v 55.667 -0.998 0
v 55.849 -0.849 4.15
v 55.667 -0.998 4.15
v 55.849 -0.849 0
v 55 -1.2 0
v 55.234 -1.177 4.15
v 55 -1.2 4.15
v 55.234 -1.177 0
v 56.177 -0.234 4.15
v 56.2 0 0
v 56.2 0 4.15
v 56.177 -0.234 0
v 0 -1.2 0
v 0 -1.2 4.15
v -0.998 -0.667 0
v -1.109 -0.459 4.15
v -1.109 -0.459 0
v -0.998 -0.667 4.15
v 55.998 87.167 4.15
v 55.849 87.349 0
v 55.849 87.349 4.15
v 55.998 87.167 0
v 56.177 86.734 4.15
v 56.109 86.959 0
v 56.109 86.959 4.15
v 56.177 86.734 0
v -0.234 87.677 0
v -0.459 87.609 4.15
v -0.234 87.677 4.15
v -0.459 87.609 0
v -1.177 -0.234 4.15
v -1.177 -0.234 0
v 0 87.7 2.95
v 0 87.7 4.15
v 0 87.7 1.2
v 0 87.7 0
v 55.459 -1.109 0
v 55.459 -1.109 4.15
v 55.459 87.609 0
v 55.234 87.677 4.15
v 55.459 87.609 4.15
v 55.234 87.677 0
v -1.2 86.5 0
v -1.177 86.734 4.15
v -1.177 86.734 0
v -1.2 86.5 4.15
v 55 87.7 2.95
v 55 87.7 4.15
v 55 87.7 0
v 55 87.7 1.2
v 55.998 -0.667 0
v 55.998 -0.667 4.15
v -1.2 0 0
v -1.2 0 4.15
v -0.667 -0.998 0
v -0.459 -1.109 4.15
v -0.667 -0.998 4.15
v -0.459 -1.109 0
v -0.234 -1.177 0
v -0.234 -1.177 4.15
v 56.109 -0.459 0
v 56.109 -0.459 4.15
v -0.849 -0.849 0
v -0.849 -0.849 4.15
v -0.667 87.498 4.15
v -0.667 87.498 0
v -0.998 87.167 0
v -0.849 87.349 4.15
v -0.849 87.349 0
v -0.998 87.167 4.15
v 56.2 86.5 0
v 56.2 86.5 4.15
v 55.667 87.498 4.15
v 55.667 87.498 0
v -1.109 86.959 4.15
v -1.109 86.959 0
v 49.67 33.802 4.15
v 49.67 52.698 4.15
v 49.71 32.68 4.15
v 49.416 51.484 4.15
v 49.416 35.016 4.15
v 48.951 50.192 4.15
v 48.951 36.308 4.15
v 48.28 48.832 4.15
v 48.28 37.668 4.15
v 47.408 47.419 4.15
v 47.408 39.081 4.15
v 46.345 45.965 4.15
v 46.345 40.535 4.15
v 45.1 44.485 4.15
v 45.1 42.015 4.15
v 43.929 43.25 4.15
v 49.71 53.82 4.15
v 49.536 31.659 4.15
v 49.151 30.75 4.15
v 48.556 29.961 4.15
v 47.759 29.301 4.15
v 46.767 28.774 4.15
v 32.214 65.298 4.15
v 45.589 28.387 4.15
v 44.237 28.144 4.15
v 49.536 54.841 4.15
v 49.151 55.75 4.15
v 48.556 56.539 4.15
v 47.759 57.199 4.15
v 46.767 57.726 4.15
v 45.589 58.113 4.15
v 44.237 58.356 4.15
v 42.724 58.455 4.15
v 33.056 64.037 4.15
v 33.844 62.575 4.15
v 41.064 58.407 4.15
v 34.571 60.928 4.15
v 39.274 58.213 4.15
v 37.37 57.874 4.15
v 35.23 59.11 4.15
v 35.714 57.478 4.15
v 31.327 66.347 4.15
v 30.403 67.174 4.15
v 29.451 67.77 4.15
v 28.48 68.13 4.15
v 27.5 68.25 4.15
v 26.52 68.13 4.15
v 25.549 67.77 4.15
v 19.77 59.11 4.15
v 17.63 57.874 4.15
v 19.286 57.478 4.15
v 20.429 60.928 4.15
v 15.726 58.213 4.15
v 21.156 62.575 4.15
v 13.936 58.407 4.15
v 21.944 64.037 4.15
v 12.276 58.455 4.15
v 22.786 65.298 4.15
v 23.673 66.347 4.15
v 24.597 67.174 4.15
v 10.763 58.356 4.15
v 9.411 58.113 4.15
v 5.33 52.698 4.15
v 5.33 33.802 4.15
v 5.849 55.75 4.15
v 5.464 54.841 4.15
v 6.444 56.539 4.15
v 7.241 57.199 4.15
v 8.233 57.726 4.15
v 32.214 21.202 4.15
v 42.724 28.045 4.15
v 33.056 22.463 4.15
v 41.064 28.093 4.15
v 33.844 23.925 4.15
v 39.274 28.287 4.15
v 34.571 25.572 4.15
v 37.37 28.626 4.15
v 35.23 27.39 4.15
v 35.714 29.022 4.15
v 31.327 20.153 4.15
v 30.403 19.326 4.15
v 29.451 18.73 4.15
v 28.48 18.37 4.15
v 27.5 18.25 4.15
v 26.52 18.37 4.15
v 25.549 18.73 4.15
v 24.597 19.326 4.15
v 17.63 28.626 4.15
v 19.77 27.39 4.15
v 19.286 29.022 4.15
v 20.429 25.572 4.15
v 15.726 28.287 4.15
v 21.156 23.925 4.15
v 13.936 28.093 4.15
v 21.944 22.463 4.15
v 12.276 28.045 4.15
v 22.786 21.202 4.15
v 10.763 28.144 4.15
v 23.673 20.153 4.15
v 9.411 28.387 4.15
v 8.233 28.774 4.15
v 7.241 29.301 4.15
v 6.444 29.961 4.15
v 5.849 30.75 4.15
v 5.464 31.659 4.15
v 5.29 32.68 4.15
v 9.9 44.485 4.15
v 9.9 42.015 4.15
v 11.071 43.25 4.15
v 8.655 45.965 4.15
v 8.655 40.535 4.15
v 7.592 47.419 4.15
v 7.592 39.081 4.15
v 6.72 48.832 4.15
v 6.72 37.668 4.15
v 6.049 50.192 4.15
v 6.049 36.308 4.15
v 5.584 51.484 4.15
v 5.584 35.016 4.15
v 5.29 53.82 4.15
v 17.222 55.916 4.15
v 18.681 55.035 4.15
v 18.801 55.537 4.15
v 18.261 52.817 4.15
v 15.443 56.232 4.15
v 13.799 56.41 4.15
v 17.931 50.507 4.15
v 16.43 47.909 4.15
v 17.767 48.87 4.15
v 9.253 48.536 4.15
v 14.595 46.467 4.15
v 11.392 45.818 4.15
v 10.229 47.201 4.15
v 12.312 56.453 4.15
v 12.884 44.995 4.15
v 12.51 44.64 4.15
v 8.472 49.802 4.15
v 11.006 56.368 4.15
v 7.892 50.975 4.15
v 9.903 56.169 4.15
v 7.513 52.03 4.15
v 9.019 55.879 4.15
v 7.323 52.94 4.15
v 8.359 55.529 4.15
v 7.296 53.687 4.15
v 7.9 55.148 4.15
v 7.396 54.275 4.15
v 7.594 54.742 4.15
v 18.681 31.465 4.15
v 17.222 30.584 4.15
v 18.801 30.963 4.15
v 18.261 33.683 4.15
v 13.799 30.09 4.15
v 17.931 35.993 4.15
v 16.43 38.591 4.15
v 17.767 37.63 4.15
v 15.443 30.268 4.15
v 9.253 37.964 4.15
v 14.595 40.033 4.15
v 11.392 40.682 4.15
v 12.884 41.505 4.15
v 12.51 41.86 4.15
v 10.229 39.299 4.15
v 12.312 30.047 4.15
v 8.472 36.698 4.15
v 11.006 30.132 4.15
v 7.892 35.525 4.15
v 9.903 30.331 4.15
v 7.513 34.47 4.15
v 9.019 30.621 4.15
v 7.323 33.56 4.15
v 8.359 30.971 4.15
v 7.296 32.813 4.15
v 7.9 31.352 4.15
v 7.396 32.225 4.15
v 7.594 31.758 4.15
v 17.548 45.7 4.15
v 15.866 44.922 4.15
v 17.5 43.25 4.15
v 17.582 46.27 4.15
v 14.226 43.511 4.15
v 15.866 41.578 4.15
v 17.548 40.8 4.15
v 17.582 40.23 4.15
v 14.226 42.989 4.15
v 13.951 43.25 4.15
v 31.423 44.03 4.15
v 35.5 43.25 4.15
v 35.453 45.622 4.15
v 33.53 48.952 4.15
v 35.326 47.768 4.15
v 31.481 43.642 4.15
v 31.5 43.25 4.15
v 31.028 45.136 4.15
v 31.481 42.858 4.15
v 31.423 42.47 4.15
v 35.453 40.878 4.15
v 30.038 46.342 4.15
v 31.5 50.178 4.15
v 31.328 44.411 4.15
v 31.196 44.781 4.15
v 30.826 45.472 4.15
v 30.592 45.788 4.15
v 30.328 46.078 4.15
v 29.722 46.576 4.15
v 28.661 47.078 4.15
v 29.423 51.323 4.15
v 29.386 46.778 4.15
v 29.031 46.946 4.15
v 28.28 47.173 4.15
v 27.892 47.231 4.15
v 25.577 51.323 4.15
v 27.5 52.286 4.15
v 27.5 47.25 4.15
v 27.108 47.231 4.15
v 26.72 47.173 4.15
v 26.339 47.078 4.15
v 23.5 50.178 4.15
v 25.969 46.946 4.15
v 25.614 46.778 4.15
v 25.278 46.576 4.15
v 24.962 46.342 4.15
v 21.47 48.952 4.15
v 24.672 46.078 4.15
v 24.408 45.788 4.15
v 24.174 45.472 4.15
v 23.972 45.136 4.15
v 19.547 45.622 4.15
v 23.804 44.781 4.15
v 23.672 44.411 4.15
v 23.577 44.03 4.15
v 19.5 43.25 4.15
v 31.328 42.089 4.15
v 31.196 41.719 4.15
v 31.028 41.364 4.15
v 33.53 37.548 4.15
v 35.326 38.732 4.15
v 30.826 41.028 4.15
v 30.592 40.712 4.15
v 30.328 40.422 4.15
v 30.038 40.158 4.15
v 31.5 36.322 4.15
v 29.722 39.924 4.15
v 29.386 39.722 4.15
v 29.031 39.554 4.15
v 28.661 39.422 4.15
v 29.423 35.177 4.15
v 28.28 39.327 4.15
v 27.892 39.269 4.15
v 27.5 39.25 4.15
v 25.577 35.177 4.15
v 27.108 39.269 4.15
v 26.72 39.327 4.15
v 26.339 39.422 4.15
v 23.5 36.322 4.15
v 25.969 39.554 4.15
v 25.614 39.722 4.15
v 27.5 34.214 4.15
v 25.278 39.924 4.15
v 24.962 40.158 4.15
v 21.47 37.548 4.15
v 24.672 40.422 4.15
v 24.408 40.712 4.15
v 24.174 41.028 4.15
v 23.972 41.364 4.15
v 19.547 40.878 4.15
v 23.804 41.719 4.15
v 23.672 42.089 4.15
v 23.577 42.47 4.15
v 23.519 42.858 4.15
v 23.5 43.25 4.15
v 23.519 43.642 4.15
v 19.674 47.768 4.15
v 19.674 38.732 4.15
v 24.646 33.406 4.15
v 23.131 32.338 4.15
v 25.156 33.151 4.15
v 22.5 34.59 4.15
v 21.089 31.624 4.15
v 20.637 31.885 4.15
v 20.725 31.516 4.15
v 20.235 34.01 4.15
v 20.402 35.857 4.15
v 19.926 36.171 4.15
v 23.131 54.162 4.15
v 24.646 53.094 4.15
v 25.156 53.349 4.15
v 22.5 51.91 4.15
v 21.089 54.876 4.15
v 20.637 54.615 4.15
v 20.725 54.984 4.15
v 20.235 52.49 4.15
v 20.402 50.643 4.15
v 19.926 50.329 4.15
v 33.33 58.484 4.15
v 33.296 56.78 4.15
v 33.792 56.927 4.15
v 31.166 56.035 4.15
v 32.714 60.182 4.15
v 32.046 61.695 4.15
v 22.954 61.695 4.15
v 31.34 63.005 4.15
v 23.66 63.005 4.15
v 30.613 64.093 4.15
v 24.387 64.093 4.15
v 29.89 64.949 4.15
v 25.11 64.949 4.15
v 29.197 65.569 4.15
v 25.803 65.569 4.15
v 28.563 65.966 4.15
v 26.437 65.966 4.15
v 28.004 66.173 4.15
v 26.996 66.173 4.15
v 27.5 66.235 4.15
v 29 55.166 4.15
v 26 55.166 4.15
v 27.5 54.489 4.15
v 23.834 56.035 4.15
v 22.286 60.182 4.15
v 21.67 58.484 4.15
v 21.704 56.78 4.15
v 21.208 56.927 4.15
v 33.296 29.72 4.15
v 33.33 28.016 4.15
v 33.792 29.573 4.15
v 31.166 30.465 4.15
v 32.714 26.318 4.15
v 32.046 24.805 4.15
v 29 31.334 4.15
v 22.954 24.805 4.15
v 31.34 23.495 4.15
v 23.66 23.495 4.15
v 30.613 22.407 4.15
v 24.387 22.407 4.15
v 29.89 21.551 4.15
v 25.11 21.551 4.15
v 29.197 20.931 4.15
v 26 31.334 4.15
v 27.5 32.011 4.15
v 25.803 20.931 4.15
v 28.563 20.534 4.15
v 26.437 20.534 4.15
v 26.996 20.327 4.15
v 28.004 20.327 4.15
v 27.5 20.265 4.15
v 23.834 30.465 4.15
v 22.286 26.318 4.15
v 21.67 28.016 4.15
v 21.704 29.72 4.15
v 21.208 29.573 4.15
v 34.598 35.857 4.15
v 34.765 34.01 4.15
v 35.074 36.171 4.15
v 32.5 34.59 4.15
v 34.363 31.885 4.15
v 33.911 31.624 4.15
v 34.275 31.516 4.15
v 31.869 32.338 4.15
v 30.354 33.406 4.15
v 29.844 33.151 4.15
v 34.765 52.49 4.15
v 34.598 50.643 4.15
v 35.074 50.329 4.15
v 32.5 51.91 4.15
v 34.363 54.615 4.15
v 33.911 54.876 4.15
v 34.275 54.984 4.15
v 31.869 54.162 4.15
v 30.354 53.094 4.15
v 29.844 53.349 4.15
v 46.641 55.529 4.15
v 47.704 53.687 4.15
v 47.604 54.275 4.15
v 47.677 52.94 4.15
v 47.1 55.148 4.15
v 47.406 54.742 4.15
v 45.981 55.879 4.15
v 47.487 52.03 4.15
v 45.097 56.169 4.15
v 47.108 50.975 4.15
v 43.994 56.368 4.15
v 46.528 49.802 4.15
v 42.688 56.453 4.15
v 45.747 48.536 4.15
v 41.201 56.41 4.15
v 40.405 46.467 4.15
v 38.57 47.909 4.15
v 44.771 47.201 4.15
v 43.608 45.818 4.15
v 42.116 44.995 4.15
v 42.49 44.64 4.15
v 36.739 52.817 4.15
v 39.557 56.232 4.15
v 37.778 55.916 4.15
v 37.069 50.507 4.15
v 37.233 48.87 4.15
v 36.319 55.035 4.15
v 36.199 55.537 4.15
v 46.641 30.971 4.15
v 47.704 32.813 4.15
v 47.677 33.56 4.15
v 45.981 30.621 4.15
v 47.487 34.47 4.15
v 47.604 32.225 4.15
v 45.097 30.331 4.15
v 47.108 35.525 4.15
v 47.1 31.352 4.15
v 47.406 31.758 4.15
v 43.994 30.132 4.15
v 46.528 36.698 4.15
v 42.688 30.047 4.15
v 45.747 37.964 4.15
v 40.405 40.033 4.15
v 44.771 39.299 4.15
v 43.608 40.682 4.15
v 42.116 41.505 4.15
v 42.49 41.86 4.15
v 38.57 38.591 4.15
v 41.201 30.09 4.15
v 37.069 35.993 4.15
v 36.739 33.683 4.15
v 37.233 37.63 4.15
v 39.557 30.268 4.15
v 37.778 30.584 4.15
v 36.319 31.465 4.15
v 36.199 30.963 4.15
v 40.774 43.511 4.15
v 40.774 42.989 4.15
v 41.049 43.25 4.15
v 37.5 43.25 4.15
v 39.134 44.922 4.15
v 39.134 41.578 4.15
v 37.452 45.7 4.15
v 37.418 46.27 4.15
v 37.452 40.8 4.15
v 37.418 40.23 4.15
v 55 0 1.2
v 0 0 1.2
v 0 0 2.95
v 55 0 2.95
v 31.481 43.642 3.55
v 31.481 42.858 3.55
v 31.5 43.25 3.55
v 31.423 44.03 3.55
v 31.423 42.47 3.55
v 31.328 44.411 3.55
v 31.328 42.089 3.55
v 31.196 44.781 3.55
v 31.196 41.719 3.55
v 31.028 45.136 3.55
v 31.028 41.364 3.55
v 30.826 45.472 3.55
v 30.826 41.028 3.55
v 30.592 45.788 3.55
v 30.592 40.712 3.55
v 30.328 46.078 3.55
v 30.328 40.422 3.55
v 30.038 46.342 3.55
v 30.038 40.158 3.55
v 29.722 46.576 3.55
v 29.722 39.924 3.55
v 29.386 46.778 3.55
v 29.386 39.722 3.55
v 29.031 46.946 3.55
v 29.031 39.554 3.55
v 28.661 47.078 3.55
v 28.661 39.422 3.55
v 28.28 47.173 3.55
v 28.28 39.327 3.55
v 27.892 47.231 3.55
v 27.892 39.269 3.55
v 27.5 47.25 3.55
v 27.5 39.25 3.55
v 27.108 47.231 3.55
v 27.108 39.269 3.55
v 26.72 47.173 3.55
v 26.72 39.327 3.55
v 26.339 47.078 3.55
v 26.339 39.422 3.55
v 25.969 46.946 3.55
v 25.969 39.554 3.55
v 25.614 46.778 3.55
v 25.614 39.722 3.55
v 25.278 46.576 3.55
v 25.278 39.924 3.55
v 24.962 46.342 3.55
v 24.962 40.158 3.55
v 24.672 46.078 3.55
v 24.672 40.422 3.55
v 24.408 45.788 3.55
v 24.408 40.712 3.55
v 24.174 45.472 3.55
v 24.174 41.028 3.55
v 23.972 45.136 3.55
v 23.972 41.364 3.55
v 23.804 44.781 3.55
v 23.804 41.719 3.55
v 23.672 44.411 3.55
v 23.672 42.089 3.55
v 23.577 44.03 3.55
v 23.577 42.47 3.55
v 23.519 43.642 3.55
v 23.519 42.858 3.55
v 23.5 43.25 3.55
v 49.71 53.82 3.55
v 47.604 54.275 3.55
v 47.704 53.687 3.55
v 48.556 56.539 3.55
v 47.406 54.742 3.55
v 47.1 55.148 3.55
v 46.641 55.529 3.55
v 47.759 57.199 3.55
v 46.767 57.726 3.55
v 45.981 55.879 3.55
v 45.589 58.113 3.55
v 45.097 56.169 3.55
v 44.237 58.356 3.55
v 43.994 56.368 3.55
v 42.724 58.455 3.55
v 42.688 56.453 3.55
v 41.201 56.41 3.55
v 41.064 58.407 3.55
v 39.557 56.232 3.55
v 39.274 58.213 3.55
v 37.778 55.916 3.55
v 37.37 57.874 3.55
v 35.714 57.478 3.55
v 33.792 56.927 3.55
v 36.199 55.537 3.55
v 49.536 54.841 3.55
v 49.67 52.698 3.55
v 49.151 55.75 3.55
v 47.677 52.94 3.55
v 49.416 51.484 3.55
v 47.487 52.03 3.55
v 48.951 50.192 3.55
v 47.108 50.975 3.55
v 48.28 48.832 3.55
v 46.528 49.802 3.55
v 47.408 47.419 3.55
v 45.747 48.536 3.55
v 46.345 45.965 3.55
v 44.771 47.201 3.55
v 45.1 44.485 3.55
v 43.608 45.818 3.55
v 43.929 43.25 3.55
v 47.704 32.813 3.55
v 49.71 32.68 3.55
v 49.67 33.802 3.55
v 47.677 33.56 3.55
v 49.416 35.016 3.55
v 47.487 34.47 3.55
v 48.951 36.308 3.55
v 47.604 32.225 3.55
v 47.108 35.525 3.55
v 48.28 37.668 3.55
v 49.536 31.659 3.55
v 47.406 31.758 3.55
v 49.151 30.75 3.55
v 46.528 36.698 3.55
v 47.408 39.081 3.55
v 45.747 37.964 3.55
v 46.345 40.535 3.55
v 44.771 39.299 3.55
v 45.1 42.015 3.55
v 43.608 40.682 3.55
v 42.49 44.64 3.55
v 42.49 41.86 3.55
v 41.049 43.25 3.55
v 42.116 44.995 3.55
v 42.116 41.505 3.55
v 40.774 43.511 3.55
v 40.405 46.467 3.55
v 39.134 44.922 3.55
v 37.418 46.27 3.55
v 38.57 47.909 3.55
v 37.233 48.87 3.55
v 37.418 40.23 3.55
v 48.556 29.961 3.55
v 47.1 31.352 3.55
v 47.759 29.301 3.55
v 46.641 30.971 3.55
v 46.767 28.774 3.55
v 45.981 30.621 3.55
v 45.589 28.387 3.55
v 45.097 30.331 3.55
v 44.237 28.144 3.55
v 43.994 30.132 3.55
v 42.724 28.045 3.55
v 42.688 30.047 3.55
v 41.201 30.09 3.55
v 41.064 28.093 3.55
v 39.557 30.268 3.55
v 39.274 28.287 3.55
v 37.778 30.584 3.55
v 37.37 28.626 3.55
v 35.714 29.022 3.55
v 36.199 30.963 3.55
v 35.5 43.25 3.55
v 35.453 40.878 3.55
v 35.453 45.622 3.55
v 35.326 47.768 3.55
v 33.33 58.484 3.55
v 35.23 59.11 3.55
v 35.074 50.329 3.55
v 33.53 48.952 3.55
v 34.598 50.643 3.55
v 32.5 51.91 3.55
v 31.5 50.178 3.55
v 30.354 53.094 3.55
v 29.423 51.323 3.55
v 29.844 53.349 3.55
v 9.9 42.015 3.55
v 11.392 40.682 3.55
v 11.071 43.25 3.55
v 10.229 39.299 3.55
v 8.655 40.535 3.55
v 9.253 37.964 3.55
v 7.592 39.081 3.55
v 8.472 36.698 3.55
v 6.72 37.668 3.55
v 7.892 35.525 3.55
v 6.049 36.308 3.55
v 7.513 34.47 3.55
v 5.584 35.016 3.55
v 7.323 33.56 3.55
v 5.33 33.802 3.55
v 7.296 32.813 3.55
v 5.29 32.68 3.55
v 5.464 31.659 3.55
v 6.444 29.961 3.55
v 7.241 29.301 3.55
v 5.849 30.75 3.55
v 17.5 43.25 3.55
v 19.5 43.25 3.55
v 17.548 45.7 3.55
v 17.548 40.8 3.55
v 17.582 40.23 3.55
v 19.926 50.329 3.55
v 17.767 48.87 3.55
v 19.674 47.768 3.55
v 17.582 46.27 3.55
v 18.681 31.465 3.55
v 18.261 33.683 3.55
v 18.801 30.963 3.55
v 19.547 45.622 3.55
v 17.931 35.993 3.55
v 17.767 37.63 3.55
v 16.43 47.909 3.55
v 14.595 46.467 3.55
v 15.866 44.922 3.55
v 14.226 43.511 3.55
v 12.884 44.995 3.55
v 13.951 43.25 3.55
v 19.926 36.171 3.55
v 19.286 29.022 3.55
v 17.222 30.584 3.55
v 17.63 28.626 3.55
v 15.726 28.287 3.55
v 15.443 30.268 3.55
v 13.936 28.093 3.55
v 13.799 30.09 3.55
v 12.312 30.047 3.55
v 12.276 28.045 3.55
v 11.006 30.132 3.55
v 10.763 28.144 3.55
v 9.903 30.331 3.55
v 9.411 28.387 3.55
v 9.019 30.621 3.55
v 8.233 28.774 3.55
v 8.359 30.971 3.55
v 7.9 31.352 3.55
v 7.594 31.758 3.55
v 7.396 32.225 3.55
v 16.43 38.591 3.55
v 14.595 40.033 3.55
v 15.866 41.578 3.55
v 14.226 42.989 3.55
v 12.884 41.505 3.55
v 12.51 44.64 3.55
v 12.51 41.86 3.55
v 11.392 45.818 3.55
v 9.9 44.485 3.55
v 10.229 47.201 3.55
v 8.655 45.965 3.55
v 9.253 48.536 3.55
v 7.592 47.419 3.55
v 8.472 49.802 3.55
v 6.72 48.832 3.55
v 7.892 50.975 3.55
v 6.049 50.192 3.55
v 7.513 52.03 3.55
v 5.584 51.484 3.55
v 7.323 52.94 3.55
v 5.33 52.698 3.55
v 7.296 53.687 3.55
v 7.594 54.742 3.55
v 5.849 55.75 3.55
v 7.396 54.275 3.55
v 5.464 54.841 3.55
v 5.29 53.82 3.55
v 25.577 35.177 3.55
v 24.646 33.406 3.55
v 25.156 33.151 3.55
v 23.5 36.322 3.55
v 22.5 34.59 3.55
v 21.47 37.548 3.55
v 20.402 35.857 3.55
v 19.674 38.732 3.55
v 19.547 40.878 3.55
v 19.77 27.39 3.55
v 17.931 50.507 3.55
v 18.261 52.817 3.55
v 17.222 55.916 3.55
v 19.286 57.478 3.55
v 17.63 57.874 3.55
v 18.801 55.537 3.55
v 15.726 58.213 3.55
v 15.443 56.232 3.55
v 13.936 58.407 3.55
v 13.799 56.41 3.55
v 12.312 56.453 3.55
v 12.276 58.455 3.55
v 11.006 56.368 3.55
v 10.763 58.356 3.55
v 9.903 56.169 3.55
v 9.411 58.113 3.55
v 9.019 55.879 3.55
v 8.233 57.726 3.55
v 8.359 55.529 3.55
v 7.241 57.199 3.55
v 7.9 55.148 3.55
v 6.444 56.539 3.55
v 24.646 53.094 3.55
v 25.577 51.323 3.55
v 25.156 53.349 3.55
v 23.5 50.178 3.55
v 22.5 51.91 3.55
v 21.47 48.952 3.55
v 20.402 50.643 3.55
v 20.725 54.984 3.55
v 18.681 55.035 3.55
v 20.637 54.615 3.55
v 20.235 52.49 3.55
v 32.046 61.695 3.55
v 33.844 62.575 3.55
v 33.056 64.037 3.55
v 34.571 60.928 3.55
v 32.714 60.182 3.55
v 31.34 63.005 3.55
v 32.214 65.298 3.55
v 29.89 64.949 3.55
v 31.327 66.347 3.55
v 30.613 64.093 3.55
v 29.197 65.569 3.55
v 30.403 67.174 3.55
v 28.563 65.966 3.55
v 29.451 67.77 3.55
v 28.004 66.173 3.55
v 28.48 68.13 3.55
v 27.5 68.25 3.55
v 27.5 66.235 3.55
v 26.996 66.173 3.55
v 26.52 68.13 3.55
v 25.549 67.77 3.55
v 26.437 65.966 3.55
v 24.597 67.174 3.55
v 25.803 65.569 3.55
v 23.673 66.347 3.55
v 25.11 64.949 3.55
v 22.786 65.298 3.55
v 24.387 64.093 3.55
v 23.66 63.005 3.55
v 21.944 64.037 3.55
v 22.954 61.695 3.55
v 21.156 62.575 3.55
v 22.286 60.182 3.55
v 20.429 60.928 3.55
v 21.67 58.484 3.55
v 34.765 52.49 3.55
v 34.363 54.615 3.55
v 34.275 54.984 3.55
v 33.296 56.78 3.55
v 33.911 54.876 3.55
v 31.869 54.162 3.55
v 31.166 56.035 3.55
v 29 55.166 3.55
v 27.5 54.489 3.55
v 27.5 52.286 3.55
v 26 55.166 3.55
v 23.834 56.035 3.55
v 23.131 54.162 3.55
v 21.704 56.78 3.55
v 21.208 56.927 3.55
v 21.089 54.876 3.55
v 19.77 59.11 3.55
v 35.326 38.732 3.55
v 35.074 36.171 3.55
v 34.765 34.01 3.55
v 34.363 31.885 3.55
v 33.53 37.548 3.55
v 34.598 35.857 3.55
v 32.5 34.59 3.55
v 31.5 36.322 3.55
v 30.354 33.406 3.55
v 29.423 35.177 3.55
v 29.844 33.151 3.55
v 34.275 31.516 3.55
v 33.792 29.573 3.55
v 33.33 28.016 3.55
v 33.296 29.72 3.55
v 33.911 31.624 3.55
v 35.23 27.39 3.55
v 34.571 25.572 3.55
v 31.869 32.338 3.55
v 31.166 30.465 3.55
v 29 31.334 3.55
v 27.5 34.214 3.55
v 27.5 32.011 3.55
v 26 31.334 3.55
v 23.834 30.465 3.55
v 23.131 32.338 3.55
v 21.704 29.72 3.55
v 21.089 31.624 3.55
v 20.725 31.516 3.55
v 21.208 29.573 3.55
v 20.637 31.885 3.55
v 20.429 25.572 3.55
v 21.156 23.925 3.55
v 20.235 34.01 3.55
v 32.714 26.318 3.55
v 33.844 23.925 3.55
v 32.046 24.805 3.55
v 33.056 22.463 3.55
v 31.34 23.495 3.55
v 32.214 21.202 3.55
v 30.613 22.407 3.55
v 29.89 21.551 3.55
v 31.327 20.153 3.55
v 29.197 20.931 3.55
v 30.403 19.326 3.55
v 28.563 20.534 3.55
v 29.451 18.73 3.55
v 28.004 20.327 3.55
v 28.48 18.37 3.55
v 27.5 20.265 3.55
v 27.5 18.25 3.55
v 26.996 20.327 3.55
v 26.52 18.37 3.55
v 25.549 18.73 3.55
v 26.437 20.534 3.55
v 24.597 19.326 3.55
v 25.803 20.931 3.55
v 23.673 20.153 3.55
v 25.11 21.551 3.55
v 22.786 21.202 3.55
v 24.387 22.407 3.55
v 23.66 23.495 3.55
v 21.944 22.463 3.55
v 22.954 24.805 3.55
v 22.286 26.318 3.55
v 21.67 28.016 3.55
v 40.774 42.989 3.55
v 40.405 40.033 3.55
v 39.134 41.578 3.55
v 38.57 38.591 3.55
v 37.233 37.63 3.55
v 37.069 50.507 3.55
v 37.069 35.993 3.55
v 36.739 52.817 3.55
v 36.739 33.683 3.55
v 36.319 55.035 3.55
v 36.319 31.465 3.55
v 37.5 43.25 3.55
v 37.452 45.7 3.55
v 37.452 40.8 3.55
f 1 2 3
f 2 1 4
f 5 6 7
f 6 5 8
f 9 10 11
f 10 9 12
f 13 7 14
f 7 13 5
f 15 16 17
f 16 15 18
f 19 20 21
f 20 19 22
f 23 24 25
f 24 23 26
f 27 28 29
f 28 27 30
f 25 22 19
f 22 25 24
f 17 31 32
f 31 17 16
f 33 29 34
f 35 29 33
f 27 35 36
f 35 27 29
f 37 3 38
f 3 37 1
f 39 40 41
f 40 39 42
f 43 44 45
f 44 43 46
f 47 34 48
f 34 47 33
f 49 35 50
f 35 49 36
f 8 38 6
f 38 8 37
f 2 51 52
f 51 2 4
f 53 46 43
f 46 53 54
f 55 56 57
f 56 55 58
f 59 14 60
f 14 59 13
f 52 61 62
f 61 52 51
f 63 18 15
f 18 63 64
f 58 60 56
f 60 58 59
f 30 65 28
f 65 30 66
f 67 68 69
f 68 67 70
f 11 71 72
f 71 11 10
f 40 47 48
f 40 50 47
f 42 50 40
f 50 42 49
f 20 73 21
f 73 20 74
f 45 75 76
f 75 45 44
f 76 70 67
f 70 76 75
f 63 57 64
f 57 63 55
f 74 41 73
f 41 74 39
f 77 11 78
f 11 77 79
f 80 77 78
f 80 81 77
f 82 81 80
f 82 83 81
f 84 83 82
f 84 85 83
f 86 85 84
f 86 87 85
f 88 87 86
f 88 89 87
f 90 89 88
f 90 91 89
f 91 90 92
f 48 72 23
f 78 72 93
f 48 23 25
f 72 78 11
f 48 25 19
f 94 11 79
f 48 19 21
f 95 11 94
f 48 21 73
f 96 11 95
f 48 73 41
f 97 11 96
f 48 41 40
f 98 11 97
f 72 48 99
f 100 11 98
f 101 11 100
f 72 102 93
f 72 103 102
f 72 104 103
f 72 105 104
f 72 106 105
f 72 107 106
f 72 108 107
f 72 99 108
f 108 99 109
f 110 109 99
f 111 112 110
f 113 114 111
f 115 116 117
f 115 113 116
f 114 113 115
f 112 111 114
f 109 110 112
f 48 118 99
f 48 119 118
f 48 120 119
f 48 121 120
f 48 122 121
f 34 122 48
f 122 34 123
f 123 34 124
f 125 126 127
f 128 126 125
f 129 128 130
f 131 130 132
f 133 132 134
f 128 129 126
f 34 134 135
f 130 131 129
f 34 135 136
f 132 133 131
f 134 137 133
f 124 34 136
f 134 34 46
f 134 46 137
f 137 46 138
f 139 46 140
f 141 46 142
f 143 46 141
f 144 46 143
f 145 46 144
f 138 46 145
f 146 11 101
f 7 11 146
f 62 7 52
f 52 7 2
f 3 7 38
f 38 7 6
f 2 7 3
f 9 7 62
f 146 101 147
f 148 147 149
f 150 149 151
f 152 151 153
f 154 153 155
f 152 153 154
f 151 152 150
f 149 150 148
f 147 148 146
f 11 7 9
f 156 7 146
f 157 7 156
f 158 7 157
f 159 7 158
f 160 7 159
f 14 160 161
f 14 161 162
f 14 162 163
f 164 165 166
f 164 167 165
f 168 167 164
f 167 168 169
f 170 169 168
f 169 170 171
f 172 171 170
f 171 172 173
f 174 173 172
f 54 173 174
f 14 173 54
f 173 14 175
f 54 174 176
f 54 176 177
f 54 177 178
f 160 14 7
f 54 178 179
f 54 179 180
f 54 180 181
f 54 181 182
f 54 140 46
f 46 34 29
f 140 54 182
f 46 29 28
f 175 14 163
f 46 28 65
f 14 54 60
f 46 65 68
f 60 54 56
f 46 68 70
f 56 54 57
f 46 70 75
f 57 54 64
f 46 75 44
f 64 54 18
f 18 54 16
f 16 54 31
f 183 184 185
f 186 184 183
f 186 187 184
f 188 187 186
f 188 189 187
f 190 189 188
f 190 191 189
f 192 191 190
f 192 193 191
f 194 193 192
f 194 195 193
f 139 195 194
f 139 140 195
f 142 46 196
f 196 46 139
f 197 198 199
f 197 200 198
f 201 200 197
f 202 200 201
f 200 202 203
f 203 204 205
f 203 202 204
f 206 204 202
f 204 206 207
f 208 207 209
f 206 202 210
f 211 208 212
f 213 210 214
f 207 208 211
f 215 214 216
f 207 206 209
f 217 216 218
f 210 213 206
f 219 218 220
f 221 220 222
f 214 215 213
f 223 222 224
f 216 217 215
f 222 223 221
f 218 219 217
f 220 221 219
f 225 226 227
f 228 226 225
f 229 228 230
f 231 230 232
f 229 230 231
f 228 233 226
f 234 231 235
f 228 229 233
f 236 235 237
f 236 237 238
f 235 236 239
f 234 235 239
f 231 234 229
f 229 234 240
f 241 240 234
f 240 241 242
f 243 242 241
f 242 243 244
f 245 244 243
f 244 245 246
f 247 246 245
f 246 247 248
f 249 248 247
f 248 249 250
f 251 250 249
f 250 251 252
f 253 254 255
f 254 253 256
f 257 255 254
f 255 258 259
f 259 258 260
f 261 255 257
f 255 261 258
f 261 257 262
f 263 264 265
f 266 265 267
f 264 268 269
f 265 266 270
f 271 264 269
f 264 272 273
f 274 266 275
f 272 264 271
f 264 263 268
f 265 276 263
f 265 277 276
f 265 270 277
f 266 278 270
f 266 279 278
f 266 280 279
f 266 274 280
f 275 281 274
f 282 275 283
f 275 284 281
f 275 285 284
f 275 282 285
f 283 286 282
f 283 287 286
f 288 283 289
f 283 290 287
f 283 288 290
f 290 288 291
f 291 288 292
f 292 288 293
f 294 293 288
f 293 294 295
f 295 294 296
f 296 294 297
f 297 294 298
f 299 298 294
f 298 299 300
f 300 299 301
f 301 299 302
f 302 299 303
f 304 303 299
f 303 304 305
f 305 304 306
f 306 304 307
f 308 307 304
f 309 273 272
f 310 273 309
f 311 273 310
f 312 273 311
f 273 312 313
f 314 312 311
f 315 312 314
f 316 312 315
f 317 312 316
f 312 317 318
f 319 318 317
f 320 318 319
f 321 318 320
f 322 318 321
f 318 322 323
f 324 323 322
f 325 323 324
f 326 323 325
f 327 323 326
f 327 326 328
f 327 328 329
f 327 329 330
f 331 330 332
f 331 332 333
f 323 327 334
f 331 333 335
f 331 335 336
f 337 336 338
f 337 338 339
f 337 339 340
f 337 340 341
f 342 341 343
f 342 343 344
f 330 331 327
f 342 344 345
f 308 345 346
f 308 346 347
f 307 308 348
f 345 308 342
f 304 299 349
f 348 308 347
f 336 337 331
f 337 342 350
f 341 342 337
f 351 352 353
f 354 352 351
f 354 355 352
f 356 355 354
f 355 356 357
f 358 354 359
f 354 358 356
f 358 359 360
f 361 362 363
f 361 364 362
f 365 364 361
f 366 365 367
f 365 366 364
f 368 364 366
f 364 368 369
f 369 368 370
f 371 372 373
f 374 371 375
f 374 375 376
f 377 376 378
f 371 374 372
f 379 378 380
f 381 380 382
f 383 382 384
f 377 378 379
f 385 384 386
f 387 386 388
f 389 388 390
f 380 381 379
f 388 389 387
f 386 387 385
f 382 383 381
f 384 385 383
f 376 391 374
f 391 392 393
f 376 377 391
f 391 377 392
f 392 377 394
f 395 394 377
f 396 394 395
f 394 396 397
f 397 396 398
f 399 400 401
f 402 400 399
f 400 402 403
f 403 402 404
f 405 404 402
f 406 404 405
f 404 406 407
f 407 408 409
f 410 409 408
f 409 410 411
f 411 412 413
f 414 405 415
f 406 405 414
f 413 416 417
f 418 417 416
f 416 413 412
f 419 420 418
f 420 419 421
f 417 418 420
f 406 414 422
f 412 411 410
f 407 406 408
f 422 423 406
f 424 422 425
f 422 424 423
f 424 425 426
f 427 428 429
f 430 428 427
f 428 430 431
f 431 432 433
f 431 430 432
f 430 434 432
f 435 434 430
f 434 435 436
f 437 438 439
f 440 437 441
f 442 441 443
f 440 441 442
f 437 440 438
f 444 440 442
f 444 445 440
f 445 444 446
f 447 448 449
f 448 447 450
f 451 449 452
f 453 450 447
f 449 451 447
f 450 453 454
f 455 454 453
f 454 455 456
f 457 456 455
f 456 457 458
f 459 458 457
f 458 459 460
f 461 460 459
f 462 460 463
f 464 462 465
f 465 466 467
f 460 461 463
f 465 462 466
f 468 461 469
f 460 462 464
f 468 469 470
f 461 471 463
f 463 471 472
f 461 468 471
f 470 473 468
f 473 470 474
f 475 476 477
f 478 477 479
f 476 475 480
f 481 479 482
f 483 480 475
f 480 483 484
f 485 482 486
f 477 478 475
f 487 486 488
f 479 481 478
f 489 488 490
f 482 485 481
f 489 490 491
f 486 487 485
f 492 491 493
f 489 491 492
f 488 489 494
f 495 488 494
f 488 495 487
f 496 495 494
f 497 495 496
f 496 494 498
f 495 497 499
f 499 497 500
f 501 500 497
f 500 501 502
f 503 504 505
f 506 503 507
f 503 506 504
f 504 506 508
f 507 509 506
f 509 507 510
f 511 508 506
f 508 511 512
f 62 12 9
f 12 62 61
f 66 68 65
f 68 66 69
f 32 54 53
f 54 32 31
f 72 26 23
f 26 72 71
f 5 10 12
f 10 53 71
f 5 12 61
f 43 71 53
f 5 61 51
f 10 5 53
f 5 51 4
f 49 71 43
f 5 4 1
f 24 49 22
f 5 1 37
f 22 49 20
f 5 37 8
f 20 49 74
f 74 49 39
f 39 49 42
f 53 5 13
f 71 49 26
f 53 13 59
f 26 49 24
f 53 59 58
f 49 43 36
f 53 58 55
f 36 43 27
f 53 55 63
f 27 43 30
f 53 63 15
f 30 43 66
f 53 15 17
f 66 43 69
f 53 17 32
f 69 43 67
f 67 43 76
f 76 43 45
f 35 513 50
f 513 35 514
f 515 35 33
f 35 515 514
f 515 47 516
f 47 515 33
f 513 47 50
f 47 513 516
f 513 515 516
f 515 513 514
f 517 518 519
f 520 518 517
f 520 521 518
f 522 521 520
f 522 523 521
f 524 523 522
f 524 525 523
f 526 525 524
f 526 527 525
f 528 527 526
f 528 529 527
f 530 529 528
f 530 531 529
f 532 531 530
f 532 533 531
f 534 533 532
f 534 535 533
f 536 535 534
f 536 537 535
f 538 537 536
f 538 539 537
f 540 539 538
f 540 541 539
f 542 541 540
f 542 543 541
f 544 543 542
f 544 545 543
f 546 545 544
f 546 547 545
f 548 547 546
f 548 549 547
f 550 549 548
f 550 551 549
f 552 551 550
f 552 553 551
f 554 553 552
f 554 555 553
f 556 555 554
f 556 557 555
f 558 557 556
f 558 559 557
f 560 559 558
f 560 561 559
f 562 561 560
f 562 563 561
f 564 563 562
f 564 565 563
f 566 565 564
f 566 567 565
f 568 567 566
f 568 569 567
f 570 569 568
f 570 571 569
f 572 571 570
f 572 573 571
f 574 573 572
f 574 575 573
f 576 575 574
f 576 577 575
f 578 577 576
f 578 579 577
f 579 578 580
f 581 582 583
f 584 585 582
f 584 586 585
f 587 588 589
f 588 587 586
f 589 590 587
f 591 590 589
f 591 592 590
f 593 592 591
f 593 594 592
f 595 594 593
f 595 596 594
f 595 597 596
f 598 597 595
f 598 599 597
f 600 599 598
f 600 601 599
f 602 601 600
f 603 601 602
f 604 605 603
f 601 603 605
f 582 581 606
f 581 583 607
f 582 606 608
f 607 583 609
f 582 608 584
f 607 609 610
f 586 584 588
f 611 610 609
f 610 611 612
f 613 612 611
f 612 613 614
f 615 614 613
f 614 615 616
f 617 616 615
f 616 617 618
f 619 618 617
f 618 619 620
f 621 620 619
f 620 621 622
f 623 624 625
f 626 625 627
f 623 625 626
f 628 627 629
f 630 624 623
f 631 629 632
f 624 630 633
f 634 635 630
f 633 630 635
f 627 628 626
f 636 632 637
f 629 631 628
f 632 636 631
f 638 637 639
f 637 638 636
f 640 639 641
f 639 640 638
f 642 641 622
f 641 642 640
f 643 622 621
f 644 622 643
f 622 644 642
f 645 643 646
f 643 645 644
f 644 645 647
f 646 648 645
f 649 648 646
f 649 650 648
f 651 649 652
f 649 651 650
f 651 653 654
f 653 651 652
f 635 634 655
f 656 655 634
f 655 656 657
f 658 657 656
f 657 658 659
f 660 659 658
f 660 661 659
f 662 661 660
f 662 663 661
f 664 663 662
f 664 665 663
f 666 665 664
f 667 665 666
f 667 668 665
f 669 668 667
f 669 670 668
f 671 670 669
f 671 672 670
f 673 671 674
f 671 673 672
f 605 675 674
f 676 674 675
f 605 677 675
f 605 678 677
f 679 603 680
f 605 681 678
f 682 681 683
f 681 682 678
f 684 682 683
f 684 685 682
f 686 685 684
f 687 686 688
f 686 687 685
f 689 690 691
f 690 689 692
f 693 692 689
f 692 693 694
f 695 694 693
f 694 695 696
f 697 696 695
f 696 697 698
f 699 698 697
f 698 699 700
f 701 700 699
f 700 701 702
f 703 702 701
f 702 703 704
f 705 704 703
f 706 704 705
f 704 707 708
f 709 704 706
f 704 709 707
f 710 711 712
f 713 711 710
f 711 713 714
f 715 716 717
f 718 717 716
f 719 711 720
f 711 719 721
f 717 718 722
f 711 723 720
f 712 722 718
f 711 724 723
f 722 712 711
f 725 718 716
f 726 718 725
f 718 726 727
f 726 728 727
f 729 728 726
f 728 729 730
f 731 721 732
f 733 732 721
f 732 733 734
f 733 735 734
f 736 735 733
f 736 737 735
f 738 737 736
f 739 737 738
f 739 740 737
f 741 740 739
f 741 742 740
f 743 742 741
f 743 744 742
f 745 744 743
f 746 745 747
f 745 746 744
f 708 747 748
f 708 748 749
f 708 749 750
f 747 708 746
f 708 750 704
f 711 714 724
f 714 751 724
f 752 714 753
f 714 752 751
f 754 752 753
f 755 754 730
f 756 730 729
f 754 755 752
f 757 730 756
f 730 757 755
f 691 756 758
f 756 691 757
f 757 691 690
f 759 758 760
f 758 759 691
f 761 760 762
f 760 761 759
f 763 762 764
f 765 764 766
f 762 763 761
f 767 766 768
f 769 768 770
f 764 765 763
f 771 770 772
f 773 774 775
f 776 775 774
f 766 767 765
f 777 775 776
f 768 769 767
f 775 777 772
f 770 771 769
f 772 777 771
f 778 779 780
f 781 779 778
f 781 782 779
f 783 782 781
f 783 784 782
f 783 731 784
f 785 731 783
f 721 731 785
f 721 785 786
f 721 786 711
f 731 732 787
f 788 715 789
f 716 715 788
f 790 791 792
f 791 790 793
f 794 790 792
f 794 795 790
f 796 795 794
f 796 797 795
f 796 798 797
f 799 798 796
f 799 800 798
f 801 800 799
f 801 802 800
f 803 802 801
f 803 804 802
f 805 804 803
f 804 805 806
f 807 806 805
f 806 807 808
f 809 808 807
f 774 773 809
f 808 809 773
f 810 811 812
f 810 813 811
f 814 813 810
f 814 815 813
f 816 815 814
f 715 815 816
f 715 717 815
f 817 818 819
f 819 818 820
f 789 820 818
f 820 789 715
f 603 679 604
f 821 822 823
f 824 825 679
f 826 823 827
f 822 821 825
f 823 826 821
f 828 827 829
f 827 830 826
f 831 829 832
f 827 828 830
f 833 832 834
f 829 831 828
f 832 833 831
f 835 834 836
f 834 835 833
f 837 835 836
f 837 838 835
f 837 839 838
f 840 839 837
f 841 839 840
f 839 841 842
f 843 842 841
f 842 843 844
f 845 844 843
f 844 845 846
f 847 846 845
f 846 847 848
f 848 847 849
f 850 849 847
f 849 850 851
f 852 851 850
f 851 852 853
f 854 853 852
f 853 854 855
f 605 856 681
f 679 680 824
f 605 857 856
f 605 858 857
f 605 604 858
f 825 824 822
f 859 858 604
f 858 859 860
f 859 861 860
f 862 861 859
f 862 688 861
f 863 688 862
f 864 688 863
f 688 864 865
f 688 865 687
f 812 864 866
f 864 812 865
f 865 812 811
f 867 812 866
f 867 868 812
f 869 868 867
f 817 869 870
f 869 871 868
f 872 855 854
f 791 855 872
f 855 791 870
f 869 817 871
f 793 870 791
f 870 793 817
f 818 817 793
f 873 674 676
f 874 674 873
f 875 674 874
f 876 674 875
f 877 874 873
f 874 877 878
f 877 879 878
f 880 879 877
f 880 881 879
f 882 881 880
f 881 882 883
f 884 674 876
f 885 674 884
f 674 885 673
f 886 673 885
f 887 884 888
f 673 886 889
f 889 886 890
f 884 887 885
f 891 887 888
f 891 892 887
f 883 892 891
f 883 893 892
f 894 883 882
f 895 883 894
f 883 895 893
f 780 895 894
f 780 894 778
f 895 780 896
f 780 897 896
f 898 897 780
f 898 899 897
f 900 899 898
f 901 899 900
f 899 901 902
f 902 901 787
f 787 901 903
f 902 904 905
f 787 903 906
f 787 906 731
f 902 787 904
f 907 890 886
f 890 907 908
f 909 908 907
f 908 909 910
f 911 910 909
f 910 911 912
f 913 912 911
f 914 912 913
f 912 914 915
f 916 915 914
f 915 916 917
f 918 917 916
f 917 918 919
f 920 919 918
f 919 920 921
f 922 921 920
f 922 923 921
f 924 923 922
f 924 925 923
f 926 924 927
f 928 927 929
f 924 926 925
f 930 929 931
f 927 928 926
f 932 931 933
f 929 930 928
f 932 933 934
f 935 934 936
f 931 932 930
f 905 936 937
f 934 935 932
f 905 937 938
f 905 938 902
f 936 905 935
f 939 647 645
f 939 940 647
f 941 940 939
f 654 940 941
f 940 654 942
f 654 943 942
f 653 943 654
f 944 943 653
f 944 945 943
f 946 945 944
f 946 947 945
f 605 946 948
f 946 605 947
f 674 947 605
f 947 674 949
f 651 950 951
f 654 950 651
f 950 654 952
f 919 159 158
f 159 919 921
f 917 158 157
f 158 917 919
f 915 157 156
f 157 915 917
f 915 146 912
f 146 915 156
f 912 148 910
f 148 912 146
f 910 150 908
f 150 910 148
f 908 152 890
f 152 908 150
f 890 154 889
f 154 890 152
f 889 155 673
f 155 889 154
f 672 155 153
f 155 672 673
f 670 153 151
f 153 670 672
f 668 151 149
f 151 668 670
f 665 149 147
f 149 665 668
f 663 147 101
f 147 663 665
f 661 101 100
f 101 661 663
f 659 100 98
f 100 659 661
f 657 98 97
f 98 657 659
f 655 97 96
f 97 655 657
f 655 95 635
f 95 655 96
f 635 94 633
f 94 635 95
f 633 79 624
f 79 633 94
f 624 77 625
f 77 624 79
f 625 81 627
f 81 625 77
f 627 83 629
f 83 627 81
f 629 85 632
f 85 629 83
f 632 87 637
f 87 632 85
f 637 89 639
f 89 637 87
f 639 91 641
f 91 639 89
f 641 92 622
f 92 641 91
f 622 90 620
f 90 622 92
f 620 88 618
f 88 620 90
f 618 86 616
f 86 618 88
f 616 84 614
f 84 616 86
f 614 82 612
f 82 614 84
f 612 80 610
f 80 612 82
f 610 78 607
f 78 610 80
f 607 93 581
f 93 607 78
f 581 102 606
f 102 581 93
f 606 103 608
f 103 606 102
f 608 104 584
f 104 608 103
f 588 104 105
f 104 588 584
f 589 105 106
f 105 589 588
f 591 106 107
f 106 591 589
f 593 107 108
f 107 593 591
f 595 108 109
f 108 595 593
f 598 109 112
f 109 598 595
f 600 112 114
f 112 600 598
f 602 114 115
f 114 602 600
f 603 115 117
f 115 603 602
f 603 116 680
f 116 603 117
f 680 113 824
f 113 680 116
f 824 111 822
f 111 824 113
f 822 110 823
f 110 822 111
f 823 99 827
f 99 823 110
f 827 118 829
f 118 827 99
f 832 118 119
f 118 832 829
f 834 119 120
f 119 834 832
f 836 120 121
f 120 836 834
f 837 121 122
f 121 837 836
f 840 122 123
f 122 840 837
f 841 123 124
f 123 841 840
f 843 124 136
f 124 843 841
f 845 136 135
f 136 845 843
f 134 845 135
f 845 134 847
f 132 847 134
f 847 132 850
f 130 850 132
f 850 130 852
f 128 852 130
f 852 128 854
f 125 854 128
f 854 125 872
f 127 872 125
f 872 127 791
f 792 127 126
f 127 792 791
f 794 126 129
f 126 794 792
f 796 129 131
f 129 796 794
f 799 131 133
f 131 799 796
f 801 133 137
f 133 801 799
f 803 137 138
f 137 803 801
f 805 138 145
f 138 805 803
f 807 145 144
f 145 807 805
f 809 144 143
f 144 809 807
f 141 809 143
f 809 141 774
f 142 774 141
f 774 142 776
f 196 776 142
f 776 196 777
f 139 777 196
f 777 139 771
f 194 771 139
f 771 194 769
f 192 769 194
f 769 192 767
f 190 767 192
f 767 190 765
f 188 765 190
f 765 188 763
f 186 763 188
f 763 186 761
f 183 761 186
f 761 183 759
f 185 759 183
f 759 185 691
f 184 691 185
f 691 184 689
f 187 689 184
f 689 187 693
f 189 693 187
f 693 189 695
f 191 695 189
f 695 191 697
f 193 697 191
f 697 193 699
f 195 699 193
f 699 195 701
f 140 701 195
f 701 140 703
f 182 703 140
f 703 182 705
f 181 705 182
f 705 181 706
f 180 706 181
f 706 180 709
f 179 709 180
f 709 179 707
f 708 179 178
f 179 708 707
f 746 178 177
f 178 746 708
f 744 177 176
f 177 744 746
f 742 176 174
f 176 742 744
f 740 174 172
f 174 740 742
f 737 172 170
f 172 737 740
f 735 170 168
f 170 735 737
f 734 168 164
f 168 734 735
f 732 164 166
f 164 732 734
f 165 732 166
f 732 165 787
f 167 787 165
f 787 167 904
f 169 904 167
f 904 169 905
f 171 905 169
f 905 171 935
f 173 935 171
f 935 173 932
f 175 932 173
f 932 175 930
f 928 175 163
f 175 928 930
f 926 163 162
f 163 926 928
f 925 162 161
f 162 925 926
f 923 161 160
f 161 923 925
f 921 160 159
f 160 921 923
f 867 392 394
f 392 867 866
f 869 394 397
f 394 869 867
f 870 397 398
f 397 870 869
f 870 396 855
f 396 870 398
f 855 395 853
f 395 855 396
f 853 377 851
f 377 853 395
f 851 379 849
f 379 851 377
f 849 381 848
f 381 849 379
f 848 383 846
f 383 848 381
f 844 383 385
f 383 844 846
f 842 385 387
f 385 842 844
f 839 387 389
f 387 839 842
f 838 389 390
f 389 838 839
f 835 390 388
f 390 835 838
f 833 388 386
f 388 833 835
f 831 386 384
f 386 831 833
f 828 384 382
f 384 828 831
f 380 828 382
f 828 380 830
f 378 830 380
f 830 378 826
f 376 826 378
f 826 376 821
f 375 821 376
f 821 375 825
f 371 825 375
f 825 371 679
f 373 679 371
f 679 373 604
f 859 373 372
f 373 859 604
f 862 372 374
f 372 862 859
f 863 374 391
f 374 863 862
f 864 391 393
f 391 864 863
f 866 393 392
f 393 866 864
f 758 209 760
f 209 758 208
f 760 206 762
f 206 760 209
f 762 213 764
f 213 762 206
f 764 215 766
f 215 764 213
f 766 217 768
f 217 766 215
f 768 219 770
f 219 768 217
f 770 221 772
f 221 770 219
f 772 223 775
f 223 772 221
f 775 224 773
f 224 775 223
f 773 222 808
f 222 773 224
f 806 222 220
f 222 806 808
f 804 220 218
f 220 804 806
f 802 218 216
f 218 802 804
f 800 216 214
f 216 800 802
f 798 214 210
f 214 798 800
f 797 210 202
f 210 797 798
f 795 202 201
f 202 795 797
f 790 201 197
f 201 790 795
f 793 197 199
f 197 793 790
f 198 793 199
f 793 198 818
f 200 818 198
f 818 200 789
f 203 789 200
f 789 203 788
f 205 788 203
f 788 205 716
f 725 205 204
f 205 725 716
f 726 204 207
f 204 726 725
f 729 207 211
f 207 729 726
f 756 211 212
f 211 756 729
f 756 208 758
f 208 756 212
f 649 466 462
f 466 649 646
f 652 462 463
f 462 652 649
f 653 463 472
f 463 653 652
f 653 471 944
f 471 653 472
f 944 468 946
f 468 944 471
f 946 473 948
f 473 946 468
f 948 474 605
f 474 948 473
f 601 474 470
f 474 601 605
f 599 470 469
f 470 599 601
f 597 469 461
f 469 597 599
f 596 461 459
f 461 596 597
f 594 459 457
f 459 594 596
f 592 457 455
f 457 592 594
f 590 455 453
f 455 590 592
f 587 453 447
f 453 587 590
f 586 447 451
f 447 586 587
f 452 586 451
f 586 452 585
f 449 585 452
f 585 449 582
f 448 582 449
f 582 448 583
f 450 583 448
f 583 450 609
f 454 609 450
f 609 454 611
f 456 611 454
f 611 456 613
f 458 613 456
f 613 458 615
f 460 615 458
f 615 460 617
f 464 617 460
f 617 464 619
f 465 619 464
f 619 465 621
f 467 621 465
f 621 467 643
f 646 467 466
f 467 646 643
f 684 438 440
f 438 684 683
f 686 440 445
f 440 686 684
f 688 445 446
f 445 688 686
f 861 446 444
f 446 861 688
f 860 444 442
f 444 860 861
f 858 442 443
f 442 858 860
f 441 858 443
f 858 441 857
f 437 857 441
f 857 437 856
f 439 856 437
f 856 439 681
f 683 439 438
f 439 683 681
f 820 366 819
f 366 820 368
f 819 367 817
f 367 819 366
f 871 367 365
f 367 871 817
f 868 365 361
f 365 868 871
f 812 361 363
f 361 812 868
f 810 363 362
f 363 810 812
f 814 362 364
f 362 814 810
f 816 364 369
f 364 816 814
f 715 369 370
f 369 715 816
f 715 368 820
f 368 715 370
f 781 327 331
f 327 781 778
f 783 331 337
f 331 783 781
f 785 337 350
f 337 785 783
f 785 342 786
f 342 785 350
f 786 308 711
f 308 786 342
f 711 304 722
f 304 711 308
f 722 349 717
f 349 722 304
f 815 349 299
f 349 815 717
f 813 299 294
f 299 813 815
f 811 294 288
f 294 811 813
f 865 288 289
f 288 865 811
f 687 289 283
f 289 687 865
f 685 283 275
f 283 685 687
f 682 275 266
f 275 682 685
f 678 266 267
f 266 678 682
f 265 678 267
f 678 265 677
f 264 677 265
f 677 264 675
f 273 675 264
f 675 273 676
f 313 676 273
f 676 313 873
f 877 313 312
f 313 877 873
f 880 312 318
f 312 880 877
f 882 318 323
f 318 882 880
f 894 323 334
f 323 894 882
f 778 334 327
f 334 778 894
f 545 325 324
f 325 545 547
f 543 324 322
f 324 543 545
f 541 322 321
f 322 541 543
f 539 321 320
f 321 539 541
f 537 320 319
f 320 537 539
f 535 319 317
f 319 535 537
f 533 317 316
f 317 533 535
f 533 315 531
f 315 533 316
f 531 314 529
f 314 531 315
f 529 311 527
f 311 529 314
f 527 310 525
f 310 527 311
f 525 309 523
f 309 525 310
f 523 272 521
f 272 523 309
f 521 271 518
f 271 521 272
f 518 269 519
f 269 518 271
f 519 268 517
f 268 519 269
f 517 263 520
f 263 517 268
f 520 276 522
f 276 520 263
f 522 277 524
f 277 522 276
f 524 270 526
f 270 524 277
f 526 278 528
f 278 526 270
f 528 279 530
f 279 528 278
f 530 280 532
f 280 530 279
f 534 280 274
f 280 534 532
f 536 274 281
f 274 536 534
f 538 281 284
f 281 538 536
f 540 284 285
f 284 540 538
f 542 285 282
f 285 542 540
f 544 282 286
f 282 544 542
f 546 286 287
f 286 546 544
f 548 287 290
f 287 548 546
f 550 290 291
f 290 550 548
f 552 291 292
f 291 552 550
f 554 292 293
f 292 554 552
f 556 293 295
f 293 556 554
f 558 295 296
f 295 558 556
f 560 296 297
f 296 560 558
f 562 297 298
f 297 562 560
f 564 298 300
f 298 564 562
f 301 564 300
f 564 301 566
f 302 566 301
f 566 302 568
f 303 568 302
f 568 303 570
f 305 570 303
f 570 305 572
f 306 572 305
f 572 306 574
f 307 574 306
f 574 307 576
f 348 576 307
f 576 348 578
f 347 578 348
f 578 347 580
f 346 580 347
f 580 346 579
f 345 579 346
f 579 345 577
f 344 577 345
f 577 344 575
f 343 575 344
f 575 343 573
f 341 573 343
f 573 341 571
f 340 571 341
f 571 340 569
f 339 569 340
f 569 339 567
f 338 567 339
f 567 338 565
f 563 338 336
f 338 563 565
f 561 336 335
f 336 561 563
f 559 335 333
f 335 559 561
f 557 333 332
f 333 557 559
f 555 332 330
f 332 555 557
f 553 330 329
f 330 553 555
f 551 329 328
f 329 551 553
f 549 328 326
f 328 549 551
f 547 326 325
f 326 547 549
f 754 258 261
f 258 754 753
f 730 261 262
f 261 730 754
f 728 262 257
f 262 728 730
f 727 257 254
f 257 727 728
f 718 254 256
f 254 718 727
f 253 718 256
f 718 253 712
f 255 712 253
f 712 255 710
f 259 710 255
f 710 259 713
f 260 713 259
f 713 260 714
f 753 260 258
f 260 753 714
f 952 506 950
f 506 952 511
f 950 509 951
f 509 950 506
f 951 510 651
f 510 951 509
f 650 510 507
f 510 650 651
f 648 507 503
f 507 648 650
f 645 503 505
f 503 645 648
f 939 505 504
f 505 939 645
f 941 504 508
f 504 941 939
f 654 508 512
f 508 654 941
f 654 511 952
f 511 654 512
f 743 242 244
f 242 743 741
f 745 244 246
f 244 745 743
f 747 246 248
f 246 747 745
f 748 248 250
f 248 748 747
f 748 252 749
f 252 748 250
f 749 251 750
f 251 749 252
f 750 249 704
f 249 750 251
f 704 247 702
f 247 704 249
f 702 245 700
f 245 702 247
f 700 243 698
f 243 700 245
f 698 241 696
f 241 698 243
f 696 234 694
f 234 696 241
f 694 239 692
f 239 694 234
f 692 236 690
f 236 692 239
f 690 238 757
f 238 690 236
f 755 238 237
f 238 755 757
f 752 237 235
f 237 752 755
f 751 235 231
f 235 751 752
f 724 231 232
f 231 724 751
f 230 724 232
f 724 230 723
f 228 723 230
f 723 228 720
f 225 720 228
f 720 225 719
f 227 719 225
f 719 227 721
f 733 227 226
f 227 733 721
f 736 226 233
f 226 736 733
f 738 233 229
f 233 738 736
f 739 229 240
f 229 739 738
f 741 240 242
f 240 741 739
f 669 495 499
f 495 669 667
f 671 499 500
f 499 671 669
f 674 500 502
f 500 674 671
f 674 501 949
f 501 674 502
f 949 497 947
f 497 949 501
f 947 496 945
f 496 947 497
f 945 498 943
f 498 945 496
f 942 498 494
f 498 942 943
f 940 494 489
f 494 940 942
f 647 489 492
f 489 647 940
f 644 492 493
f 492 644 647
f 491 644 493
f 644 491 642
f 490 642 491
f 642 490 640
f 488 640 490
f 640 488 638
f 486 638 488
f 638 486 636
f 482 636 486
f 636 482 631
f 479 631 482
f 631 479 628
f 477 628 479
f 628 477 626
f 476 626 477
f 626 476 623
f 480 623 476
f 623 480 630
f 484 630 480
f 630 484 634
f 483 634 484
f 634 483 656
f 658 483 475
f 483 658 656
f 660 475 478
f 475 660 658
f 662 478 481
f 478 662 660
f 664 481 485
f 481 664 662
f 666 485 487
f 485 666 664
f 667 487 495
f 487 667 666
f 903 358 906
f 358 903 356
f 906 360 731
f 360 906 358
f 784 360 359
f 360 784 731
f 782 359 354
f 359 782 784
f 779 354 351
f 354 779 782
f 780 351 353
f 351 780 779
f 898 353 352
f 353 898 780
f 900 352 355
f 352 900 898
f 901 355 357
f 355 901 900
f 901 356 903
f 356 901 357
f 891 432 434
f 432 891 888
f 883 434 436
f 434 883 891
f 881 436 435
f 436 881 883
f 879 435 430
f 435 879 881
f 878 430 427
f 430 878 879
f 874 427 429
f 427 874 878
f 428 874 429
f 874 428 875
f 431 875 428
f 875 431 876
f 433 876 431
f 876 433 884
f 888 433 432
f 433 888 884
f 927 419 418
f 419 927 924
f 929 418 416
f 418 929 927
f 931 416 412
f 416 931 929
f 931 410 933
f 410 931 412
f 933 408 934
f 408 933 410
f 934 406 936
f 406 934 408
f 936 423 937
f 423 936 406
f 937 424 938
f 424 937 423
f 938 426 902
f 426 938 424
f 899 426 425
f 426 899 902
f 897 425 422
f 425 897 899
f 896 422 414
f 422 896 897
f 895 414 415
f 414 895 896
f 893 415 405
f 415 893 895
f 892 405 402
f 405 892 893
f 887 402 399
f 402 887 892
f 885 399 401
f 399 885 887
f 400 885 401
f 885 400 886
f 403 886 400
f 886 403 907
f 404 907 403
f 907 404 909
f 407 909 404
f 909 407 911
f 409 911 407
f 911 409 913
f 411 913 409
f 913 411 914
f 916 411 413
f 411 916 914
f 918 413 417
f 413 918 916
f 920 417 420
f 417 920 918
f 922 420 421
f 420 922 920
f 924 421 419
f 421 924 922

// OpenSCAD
tol = 0.5;
card_d = [54, 85.5];
card_t = 0.75;
wall_t = 1.2;

card_d_t = card_d + [tol, tol] * 2;
card_t_t = card_t + tol * 2;

module card() {
    square(card_d_t);
}

module card_diff() {
    square(card_d_t + [0, wall_t + tol]);
}

module card_plate() {
    offset(wall_t, $fn = 32)
    card();
}


module ellipse(r1, r2) {
    
    scale([1, r2 / r1])
        circle(r = r1);
}

module ellipse_outline(r1, r2, t) {
    difference() {
        ellipse(r1, r2);
        offset(-t)
            ellipse(r1, r2);
    }
}


module react_logo() {
    $fn = 64;
    for (i = [0:2]) 
        rotate(i * 60) 
            ellipse_outline(10, 25, 2);
    circle(r = 4);
}



    

difference() {
    
    
    linear_extrude(wall_t + card_t_t + wall_t)
        card_plate();
    
    translate([0,0,wall_t])
        linear_extrude(card_t_t)
            card_diff();
    
    translate([card_d_t[0] / 2, card_d_t[1] / 2, wall_t * 1.5 + card_t_t])
        linear_extrude(wall_t)
            react_logo();
    
}
